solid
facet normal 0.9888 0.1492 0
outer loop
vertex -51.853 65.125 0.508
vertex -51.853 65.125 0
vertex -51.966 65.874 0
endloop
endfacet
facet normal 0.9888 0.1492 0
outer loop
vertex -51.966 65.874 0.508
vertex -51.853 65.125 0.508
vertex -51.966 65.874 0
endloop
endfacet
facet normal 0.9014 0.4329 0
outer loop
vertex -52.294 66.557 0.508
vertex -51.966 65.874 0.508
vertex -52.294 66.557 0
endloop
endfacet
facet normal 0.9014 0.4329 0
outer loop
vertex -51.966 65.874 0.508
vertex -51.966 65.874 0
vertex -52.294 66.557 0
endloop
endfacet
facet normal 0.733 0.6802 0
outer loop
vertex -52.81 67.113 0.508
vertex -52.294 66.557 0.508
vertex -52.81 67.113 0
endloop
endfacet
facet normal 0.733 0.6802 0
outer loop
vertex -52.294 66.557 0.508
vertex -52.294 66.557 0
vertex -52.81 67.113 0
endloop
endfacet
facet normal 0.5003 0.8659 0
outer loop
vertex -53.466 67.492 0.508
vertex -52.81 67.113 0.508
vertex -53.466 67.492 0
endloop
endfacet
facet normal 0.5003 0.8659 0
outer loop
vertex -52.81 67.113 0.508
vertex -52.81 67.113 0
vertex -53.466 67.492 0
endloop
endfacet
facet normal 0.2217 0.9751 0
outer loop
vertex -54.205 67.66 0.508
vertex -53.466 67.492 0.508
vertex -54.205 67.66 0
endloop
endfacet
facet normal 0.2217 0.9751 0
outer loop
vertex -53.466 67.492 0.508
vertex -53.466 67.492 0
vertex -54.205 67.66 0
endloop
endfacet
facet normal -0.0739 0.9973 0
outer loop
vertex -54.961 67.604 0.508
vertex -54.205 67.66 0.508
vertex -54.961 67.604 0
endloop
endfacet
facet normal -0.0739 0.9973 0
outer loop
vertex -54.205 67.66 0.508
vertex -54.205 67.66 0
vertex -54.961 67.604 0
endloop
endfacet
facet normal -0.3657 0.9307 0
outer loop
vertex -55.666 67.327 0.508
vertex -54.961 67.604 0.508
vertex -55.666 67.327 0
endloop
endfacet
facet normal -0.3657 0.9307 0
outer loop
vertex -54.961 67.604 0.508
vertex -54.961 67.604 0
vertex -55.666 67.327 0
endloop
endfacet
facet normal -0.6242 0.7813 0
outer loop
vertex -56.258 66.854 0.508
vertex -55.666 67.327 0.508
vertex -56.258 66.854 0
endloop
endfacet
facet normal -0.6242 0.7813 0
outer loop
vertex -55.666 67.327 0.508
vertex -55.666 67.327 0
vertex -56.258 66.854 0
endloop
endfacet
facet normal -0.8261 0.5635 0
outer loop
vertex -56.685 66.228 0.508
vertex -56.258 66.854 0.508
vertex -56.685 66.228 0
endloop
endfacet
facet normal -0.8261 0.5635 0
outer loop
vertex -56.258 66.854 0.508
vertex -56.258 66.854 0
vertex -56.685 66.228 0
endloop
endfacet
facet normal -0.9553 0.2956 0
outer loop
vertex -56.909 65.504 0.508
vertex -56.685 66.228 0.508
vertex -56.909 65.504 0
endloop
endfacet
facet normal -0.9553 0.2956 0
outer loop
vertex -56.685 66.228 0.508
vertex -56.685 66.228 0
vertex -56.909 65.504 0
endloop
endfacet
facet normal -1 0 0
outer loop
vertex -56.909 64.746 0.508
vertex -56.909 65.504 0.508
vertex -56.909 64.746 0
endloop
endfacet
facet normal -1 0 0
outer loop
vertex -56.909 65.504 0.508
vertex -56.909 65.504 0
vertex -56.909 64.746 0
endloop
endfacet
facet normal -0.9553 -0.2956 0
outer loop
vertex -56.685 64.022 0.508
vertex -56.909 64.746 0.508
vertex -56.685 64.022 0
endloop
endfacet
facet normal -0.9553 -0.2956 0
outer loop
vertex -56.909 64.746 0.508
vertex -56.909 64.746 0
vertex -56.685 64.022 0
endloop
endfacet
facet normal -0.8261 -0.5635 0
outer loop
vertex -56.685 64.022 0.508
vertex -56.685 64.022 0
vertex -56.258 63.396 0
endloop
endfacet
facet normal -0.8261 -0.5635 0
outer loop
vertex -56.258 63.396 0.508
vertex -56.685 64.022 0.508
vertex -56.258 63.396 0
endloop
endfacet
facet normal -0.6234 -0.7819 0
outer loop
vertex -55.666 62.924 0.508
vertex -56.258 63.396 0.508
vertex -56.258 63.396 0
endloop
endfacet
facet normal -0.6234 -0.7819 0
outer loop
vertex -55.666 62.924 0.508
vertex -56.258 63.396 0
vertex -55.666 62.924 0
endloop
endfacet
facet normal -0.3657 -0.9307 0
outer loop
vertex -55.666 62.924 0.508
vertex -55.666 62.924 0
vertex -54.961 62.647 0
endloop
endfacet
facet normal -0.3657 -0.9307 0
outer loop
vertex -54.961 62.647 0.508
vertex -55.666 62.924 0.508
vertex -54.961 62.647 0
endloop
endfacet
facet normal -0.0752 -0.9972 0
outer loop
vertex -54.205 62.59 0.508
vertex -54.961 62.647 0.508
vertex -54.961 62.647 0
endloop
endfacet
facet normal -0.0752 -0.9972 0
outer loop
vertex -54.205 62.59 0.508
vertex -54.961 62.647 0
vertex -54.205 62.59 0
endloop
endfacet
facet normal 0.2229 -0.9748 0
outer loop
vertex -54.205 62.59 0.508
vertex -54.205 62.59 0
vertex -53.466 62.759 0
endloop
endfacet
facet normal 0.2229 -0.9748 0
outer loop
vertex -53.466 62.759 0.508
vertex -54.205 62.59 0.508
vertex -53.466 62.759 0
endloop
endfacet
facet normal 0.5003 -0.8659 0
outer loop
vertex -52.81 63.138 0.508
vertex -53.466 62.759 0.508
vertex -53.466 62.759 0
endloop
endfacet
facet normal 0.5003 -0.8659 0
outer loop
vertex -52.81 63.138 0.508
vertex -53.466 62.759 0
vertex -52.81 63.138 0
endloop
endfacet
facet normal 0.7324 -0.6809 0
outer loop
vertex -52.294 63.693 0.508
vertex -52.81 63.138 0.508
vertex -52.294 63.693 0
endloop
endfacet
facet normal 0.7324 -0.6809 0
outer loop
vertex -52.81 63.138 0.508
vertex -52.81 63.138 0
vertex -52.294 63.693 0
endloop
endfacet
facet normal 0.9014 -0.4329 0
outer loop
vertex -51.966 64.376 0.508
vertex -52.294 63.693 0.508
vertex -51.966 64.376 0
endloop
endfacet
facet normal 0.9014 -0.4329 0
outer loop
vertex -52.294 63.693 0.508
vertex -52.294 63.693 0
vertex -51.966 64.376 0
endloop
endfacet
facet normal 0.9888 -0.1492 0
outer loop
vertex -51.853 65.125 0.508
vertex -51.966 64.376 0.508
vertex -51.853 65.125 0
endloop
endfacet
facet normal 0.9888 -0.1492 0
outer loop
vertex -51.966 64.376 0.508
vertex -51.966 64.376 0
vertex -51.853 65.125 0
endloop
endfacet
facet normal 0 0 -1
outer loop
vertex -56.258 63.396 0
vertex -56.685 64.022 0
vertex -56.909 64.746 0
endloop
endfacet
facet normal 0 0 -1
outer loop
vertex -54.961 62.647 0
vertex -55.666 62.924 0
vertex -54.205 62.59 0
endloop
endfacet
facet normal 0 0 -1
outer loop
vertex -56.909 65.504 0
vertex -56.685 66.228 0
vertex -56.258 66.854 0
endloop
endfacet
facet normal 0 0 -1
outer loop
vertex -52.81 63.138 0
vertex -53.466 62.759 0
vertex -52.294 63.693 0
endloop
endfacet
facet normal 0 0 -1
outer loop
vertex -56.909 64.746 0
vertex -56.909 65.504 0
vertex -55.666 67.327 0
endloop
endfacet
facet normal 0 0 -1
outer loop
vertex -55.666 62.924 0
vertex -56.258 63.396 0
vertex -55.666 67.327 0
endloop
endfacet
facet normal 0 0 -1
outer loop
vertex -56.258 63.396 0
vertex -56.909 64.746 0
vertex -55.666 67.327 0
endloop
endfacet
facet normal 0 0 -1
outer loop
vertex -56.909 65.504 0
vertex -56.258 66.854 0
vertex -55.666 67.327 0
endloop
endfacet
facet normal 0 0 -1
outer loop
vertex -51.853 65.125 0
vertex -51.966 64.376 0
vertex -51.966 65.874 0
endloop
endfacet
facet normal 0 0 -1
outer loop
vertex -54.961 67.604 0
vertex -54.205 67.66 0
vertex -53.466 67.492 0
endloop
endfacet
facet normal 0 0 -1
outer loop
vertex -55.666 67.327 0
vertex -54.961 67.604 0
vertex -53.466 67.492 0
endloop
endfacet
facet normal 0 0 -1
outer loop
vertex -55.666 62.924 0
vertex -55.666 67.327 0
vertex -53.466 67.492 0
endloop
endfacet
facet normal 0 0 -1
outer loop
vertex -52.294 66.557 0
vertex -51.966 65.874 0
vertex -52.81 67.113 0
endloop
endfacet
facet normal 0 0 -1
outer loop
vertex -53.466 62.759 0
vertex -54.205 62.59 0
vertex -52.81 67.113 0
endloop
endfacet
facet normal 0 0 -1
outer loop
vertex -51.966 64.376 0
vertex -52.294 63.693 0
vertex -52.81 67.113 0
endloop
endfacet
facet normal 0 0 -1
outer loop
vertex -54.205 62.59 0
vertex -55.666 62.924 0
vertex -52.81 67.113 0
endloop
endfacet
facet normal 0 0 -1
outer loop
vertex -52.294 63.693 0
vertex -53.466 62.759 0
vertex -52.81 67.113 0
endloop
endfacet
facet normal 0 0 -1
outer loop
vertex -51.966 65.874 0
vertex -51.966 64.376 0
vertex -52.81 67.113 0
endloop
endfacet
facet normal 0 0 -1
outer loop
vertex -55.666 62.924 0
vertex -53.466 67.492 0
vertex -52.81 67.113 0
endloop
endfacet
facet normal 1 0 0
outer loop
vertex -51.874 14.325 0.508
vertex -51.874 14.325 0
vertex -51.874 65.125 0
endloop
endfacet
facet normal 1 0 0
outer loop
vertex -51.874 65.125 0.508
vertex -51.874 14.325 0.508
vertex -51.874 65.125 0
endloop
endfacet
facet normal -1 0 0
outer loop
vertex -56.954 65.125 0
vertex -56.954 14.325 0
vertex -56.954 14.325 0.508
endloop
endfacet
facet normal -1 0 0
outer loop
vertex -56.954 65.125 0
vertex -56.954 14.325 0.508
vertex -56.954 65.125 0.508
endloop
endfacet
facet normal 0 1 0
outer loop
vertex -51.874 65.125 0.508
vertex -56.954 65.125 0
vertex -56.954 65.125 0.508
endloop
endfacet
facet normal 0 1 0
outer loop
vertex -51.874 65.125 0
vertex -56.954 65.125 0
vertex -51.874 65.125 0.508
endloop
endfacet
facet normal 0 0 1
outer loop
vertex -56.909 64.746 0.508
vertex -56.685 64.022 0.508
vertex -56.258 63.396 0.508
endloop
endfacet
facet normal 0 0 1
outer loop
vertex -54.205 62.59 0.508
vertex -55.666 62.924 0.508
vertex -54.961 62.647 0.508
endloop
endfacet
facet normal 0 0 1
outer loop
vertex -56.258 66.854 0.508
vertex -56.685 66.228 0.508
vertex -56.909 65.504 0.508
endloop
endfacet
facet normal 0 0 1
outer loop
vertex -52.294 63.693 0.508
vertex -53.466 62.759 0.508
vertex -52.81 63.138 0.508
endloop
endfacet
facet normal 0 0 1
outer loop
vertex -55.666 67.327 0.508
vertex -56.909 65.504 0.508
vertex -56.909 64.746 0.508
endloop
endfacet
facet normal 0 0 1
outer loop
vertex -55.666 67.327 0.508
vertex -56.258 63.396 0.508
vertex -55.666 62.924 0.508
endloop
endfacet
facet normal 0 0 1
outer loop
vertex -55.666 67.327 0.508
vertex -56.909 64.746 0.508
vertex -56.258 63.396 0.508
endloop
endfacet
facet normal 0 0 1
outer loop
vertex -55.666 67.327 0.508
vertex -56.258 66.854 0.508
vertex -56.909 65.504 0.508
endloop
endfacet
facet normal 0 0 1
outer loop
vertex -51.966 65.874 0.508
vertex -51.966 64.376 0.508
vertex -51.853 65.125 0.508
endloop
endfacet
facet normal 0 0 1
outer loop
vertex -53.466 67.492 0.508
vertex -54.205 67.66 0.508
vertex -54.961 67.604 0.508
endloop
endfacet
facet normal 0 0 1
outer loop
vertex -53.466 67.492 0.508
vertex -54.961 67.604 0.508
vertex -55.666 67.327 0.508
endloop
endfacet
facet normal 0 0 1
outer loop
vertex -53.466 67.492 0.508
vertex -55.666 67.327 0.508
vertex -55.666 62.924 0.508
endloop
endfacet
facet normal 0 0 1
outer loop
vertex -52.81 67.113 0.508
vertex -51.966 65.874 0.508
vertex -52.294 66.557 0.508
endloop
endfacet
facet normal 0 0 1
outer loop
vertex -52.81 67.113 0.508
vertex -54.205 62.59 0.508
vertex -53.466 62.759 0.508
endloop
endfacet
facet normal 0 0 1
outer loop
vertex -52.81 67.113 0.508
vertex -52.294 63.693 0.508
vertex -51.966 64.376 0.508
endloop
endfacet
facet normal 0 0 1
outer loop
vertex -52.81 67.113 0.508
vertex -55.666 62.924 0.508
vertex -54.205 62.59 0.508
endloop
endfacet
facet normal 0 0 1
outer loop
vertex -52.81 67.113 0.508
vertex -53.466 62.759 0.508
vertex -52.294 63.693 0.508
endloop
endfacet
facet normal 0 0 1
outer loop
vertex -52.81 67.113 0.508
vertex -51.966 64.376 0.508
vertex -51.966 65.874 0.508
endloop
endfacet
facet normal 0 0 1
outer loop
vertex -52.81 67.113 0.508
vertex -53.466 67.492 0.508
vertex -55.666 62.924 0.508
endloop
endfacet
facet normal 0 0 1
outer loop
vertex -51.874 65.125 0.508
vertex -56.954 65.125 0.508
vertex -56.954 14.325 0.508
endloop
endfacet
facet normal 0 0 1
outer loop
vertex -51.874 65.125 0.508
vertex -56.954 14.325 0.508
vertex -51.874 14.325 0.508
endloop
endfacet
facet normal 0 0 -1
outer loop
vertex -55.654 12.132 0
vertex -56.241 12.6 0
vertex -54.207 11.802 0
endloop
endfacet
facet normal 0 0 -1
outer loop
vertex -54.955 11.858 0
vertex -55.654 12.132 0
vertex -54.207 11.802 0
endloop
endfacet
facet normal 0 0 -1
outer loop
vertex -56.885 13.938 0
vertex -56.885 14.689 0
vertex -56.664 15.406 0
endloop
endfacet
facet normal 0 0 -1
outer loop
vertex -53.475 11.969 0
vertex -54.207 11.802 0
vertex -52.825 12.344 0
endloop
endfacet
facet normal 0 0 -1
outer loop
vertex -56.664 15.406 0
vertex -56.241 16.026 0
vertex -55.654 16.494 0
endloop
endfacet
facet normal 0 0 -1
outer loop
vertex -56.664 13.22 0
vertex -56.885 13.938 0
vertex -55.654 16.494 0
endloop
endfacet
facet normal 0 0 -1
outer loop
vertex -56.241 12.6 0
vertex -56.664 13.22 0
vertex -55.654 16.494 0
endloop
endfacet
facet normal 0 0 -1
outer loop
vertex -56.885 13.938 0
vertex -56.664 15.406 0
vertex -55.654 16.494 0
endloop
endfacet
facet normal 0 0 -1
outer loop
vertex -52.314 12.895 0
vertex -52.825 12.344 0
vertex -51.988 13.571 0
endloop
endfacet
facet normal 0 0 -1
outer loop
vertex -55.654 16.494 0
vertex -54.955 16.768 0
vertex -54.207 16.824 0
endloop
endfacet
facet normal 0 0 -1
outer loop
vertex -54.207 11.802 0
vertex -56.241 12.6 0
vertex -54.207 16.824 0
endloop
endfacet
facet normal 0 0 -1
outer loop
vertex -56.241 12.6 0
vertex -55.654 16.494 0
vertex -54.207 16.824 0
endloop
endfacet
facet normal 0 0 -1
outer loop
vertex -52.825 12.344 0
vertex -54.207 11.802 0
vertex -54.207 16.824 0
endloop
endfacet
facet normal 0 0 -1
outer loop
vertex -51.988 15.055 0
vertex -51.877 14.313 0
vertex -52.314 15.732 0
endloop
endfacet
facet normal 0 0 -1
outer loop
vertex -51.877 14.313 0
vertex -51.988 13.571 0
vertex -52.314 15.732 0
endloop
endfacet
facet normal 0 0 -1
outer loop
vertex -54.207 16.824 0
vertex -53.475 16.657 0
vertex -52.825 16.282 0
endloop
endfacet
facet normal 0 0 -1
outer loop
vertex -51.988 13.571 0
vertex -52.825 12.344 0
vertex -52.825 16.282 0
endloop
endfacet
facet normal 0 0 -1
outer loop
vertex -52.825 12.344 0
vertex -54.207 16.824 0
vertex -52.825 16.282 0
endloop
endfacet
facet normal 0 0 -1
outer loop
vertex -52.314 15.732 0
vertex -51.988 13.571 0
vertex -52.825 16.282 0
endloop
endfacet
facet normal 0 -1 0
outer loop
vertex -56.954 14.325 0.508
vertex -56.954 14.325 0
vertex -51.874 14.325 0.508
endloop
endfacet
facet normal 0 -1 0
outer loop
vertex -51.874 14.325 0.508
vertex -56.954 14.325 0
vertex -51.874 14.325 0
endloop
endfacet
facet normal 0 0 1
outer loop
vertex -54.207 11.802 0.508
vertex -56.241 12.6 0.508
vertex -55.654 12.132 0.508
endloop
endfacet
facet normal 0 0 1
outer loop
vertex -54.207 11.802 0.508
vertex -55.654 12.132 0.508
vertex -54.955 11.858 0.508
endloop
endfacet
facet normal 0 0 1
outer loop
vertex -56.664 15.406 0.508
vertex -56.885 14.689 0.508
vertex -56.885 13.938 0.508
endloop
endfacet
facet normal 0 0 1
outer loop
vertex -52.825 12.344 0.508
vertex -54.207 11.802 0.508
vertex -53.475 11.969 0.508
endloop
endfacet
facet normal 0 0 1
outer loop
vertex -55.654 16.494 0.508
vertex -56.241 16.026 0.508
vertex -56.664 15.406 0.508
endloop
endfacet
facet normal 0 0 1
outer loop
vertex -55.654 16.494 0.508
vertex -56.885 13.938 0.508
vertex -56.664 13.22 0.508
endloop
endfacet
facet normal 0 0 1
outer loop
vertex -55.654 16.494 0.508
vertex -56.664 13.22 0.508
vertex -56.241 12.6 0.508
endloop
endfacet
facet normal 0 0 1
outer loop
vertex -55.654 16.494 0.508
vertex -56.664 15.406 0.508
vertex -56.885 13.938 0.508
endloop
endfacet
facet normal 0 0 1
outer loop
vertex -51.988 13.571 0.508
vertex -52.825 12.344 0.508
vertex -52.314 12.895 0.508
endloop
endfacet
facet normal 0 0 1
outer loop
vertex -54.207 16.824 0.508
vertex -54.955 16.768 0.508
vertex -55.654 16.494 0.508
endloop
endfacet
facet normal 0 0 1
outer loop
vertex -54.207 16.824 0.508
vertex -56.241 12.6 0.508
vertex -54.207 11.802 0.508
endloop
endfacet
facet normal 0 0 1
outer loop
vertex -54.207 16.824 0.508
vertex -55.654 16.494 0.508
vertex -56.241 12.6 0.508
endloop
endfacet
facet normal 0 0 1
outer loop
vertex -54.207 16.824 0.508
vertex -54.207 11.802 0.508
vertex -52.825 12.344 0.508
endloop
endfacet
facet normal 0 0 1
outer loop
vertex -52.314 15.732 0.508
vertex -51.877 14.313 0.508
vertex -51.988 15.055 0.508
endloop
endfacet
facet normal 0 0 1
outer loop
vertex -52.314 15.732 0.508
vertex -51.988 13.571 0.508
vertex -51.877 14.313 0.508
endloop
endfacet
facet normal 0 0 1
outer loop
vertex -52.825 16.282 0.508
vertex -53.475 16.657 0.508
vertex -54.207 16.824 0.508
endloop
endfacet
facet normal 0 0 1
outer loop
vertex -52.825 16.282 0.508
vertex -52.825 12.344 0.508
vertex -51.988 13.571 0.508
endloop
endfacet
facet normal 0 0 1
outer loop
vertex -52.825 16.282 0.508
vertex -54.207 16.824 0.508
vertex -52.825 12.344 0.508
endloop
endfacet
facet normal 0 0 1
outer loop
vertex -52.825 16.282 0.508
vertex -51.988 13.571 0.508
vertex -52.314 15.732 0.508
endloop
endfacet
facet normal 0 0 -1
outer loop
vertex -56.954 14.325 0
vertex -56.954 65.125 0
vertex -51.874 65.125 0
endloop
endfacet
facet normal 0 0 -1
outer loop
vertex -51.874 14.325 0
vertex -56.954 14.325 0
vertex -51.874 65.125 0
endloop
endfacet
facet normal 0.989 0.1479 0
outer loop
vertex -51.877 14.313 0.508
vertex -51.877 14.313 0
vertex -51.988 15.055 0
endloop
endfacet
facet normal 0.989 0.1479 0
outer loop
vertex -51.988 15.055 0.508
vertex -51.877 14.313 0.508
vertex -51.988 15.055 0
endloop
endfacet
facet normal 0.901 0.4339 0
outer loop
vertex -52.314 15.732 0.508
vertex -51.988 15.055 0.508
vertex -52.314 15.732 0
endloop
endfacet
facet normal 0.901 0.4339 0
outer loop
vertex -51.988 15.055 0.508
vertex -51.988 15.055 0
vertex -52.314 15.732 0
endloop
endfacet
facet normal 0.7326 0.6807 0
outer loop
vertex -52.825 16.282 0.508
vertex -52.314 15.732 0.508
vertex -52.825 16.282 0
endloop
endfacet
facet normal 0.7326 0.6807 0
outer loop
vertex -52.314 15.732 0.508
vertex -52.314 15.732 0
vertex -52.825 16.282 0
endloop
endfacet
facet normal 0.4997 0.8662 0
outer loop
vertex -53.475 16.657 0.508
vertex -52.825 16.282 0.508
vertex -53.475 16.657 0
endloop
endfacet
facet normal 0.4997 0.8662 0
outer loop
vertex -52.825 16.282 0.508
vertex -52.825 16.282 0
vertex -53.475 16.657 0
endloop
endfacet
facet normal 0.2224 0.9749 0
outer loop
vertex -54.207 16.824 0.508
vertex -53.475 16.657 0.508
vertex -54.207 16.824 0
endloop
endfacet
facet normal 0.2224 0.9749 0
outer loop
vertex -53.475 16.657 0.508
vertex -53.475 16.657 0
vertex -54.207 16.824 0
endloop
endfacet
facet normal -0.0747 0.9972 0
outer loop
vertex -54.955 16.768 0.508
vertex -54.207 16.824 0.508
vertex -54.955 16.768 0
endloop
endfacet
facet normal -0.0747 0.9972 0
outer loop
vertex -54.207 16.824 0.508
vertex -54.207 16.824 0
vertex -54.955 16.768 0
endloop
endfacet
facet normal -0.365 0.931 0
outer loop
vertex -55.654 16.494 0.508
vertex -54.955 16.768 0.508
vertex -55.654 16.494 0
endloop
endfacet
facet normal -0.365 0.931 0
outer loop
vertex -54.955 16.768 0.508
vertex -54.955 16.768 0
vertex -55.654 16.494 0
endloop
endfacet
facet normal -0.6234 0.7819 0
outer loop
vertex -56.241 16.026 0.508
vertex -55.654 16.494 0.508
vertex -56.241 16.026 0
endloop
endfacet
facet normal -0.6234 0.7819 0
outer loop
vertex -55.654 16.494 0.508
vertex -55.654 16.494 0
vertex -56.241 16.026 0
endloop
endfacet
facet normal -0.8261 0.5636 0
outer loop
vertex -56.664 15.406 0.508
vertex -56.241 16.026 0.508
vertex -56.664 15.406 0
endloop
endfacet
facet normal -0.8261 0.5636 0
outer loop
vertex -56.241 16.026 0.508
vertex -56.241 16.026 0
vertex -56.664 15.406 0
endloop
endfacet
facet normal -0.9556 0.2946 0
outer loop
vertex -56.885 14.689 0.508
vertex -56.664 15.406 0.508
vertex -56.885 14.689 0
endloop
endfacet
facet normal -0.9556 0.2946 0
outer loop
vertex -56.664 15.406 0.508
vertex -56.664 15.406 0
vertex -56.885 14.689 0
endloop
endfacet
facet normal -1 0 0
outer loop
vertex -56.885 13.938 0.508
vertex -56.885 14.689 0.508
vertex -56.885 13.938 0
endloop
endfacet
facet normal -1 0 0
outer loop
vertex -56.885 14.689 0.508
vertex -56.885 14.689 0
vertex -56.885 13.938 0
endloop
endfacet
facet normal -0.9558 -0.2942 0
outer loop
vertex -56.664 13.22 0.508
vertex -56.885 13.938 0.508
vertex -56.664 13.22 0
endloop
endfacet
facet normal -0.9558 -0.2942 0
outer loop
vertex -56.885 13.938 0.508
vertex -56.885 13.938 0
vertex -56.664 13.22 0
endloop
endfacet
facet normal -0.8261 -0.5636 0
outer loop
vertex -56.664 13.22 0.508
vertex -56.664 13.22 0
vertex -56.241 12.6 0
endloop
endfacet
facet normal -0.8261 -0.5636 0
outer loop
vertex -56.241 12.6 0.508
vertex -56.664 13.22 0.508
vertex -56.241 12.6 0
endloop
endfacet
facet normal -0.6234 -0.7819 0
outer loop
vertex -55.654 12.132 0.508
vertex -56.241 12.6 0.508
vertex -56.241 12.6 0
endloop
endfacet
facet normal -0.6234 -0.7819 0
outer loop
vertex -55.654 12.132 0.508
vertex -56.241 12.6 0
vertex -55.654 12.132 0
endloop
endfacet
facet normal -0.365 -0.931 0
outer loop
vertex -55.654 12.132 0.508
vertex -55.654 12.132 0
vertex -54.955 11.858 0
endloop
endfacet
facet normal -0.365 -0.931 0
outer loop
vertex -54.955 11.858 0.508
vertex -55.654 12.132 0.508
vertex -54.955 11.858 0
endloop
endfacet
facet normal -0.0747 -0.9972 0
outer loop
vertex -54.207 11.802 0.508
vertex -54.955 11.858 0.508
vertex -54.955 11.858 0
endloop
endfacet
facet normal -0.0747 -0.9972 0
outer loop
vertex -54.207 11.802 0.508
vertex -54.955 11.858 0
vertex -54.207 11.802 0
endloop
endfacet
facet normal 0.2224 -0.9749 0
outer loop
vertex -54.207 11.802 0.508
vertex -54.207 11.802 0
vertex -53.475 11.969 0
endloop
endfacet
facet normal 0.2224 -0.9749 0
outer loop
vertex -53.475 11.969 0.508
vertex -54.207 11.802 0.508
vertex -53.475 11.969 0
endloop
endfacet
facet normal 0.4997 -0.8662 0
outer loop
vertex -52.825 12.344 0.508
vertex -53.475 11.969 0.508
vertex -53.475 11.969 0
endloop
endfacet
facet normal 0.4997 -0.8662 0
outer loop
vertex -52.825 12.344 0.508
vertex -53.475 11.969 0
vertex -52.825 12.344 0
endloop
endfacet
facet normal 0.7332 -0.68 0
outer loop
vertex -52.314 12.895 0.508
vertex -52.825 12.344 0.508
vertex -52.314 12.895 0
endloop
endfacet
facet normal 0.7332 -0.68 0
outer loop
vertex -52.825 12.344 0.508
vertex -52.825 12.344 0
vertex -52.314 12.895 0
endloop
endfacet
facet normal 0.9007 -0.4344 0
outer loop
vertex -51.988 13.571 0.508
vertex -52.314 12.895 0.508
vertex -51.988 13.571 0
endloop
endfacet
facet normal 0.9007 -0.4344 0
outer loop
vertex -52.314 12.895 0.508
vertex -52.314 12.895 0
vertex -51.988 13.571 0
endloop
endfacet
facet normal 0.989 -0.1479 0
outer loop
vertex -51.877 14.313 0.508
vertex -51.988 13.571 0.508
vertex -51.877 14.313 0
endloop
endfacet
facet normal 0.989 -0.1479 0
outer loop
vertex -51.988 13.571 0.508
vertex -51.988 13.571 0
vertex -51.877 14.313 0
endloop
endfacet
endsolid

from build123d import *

# Parameters (mm, degrees)
F0_W     = 5.08
F0_H     = 50.8
F3_DEPTH = 0.508
F1_R     = 2.5422270568
F1_R_2   = 2.5183658608


with BuildPart() as f3:
    # F0 (on Top) → F3 (new body)
    with BuildSketch(Plane.XY):
        with Locations((-54.4140953571, 39.7249583329)):
            Rectangle(F0_W, F0_H)
    extrude(amount=F3_DEPTH)


with BuildPart() as f3b:
    # F1 (on Top) → F3, piece 2 (new body)
    with BuildSketch(Plane.XY):
        with Locations((-54.3948672712, 65.1251375675)):
            Circle(F1_R)
    extrude(amount=F3_DEPTH)


with BuildPart() as f3c:
    # F1 (on Top) → F3, piece 3 (new body)
    with BuildSketch(Plane.XY):
        with Locations((-54.3948672712, 14.3131716177)):
            Circle(F1_R_2)
    extrude(amount=F3_DEPTH)


solid = Compound([f3.part, f3b.part, f3c.part])
